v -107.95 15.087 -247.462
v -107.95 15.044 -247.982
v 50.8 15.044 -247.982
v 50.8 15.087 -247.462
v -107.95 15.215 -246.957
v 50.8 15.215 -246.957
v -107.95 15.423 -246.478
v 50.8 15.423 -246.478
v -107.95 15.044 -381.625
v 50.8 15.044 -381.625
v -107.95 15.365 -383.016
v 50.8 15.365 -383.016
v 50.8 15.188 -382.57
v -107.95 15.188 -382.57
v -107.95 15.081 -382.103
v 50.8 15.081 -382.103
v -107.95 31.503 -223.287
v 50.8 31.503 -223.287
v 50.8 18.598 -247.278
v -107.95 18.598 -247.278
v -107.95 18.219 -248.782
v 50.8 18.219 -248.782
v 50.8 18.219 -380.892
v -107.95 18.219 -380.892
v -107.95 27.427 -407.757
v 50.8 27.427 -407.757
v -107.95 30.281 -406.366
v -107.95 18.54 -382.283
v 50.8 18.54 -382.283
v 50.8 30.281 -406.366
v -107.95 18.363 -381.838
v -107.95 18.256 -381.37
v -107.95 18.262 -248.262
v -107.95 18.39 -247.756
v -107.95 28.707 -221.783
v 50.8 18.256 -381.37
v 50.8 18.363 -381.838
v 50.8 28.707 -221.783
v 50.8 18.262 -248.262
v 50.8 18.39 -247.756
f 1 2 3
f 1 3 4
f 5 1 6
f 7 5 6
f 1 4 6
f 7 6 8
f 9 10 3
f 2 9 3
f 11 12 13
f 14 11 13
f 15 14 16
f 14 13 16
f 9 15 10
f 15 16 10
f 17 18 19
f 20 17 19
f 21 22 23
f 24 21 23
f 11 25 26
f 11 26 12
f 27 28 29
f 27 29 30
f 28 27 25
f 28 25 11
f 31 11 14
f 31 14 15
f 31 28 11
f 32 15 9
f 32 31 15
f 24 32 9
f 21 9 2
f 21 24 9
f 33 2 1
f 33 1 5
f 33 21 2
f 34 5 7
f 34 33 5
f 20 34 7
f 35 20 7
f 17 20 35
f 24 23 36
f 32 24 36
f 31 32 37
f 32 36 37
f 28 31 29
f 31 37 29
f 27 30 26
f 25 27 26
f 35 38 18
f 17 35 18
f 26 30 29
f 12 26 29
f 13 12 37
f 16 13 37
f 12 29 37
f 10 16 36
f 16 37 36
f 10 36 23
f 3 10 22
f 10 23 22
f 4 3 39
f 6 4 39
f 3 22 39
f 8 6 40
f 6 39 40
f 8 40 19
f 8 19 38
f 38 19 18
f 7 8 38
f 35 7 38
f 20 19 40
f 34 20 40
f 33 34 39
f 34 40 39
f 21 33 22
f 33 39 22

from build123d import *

# Parameters (mm, degrees)
BOSS_EXTRUDE1_START = 50.8
BOSS_EXTRUDE1_DEPTH = 158.75


with BuildPart() as part:
    # Sketch2 → Boss-Extrude1 (new body)
    with BuildSketch(Plane(origin=(0, 0, 0), x_dir=(0, 0, -1), z_dir=(1, 0, 0)).offset(BOSS_EXTRUDE1_START)):
        with BuildLine():
            Line((223.286729101, 31.503116997), (247.278106278, 18.598154513))
            ThreePointArc((247.278106278, 18.598154513), (248.00664125, 18.315474111), (248.782155913, 18.219305384))
            Line((248.782155913, 18.219305384), (380.892090883, 18.219305384))
            ThreePointArc((380.892090883, 18.219305384), (381.606009815, 18.300611029), (382.283364565, 18.540363804))
            Line((382.283364565, 18.540363804), (406.366180194, 30.280543711))
            Line((406.366180194, 30.280543711), (407.757453877, 27.426602131))
            Line((407.757453877, 27.426602131), (383.016046062, 15.365363804))
            ThreePointArc((383.016046062, 15.365363804), (382.338691312, 15.125611029), (381.62477238, 15.044305384))
            Line((381.62477238, 15.044305384), (247.982417689, 15.044305384))
            ThreePointArc((247.982417689, 15.044305384), (247.206903026, 15.140474111), (246.478368054, 15.423154513))
            Line((246.478368054, 15.423154513), (221.782679465, 28.706966126))
            Line((221.782679465, 28.706966126), (223.286729101, 31.503116997))
        make_face()
    extrude(amount=-BOSS_EXTRUDE1_DEPTH)


solid = part.part
